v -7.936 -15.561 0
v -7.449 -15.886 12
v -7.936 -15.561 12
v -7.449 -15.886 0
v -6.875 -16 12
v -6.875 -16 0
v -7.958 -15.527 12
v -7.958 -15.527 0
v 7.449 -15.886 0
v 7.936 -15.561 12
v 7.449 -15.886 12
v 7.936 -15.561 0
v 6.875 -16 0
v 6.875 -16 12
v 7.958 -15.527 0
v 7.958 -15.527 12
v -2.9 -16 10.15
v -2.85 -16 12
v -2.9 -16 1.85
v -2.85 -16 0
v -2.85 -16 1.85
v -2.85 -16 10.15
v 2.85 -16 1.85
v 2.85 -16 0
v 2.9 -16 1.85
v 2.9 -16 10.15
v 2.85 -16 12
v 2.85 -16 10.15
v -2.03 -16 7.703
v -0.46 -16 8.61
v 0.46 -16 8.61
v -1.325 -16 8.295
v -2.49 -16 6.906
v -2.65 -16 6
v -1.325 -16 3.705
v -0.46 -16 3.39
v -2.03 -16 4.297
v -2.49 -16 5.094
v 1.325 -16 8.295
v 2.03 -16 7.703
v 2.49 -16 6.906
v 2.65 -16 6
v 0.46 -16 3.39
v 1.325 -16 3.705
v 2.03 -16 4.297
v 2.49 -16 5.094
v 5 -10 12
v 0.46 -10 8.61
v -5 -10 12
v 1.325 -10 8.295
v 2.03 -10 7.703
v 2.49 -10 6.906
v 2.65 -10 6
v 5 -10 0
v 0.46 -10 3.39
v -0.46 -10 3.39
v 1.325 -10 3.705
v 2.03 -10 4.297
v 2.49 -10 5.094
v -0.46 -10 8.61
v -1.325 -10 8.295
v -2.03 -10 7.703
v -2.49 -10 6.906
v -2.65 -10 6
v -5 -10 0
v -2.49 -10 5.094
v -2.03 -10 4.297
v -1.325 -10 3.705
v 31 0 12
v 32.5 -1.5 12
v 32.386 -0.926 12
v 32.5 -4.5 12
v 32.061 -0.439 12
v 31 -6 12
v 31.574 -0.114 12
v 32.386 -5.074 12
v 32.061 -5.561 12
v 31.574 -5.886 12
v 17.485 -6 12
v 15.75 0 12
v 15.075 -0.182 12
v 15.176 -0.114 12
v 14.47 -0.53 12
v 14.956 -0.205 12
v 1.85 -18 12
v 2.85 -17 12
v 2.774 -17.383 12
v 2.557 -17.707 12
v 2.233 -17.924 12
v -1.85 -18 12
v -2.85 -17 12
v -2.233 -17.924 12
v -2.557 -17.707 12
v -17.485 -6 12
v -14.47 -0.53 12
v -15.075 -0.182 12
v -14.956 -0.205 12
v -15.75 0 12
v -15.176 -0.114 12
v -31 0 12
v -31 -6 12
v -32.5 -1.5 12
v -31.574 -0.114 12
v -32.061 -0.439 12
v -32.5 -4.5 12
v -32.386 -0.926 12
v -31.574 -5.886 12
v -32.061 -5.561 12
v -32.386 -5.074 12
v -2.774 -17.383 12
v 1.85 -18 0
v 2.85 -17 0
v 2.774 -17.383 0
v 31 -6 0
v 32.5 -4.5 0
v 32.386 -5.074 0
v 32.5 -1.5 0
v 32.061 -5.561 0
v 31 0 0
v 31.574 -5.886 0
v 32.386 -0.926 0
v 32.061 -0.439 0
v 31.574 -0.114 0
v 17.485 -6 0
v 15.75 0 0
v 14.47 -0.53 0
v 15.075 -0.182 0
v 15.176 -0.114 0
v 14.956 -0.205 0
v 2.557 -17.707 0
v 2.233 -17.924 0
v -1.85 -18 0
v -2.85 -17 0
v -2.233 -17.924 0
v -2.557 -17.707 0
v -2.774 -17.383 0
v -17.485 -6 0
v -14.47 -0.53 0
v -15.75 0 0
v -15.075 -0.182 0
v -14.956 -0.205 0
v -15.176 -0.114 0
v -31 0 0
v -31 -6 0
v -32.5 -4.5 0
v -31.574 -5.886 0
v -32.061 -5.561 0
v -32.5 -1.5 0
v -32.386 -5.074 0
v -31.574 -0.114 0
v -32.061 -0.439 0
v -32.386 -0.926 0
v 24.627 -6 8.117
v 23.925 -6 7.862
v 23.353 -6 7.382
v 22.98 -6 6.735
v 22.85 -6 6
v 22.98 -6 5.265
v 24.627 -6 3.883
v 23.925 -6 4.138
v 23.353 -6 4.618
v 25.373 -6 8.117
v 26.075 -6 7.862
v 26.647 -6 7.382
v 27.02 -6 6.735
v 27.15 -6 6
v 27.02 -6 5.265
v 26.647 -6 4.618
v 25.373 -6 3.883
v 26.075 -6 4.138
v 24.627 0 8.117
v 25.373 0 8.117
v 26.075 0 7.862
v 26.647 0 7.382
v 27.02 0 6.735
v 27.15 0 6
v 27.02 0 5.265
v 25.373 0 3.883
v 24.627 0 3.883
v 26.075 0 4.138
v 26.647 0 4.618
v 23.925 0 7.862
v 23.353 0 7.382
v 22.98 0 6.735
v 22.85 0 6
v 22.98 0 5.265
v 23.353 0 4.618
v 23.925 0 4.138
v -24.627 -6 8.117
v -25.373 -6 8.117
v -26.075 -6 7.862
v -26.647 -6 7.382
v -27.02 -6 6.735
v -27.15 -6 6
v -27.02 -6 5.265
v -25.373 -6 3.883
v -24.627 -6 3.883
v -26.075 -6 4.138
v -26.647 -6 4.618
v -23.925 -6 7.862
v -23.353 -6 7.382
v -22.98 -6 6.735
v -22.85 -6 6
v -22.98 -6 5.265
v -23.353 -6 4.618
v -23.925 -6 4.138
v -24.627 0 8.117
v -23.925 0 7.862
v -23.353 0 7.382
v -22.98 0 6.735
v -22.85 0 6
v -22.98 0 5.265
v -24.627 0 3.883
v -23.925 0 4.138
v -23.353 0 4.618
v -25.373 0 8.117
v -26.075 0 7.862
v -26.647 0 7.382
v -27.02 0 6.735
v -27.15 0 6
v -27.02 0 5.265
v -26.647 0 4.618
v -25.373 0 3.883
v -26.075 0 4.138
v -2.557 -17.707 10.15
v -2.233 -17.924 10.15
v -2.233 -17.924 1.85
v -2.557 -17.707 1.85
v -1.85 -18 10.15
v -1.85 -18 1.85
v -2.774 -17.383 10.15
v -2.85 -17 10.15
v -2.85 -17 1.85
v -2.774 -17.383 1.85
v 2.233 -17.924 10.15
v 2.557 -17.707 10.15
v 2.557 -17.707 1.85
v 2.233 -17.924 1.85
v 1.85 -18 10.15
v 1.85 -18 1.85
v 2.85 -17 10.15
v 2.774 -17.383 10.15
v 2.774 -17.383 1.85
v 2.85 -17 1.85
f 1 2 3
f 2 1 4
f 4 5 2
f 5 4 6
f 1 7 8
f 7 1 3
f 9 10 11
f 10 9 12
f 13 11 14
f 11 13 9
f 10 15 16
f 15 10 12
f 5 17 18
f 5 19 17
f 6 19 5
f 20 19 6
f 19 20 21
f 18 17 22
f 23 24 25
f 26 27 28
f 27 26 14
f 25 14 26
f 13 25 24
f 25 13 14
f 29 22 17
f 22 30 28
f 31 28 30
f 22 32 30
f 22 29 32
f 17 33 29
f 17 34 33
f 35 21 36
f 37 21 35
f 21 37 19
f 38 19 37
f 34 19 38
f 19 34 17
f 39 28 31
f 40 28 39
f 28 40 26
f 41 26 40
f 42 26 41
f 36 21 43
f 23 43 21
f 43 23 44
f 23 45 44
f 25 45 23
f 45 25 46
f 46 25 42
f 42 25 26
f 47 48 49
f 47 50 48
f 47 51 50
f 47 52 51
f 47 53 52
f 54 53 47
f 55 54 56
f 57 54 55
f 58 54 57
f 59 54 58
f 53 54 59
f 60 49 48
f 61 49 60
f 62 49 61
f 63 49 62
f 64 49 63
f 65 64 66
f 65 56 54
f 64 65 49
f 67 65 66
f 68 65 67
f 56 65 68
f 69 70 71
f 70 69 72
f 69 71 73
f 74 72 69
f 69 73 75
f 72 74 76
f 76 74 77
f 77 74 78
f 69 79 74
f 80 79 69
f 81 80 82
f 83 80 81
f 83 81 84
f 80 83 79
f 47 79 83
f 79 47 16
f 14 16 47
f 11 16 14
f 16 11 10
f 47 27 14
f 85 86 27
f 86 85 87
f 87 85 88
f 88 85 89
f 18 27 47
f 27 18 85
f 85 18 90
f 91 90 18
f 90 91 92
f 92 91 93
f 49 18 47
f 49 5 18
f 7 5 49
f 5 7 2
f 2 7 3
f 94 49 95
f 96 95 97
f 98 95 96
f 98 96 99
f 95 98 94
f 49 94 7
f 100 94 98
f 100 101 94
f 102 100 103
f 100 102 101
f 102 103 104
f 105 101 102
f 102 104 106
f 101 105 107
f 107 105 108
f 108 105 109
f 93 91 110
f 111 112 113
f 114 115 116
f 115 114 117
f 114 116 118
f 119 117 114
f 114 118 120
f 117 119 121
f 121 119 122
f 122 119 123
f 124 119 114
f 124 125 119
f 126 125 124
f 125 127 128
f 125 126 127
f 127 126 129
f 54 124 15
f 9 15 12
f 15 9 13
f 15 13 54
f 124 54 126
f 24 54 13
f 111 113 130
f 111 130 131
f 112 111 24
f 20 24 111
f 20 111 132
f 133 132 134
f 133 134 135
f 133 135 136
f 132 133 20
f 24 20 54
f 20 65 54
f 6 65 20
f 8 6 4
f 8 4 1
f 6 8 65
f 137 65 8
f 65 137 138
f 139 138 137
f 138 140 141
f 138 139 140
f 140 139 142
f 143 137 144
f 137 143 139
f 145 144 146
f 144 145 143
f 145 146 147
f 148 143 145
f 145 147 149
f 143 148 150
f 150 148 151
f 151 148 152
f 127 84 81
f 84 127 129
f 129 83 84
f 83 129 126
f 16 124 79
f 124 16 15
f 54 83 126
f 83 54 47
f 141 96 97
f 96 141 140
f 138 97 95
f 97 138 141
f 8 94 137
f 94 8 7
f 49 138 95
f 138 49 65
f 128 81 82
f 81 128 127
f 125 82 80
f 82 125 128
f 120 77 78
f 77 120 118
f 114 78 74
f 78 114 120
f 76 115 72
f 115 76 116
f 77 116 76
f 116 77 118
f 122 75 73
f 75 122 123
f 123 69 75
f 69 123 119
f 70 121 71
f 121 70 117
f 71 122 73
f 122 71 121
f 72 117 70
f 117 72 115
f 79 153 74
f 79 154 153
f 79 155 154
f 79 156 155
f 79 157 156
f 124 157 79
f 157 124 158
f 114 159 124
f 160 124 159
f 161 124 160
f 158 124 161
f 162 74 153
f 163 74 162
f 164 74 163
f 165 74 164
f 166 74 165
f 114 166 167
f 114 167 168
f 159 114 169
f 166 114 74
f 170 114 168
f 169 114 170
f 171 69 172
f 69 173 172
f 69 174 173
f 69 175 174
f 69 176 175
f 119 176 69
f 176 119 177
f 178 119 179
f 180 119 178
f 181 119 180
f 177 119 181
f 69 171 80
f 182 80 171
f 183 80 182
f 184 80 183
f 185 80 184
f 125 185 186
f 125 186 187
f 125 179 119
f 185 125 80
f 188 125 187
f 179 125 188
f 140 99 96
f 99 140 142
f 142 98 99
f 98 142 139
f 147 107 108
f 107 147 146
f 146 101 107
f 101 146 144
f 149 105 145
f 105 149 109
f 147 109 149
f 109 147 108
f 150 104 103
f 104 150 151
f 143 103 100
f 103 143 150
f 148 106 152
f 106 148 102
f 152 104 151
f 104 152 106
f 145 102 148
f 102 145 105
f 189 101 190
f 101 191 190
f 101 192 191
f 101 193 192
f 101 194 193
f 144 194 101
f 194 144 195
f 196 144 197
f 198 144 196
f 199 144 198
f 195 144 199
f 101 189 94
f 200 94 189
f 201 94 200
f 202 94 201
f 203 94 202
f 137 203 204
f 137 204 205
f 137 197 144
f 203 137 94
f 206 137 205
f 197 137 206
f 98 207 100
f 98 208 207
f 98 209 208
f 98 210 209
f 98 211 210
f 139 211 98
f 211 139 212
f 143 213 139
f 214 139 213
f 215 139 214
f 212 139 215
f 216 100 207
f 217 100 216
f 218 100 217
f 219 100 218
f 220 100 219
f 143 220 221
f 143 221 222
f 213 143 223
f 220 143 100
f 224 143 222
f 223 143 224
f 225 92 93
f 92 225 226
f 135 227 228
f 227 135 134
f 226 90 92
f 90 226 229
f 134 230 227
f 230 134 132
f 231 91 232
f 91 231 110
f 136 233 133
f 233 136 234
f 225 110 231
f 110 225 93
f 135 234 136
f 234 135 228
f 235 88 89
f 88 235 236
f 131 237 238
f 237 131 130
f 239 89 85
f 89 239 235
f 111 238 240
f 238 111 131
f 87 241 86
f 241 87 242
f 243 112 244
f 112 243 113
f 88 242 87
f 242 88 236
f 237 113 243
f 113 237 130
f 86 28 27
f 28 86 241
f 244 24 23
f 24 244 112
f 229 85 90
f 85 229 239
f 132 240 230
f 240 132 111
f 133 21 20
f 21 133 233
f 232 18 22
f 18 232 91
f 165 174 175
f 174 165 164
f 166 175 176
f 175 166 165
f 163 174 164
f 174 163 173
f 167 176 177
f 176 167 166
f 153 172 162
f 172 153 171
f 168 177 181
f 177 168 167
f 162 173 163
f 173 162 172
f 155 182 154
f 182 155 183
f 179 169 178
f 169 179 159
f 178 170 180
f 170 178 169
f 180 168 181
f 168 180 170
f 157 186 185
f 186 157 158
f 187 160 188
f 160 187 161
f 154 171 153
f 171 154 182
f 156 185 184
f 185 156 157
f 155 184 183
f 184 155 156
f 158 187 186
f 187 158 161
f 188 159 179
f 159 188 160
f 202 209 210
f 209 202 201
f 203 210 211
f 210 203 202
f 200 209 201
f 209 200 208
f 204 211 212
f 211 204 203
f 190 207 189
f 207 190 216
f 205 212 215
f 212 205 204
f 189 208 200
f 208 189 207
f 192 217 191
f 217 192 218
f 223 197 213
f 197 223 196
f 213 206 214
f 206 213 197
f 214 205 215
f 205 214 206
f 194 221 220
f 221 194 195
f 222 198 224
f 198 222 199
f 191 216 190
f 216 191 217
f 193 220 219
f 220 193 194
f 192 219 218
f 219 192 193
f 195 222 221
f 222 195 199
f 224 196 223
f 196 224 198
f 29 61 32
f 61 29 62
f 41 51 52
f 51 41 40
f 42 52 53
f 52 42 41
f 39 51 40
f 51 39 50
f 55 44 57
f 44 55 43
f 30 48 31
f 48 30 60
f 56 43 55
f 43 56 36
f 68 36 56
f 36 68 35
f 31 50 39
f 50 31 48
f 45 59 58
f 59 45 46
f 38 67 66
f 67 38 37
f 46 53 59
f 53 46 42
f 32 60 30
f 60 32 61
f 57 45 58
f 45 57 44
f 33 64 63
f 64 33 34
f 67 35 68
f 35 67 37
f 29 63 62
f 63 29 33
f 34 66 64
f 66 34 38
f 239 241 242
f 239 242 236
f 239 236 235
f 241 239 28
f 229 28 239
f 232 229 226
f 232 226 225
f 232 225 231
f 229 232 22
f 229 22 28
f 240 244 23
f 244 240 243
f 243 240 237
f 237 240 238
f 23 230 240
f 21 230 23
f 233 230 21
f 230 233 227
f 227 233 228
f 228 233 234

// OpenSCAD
psu_mount_hole_distance = 50; // [0.0:200.0]
psu_mount_hole_d = 4;         // [0.0:10.0]
frame_mount_hole_d = 5;       // [0.0:10.0]
extra_hole_d_tenth = 3;       // [0.0:9.0]
middle_piece_width = 10;      // [0.0:180.0]
middle_piece_height = 10;     // [0.0:30.0]
bracket_width = 12;           // [0.0:30.0]
rill_width = 5;               // [0.0:10.00]
extra_rill_width_tenth = 7;   // [0.0:9.0]

/* [Hidden] */
rill_height = 2;
rill_round_edge = 1;
bracket_round_edge = 1.5;
bracket_height = 6;
bracket_length_beyond_psu_hole = 7.5;

rotate([90,0,0])
difference()
{
  
  extra_rill_width = extra_rill_width_tenth / 10;
  
  union()
  {
    // Middle piece
    translate([-middle_piece_width/2 - bracket_round_edge*2.25, 0, middle_piece_height])
      cube_fillet([middle_piece_width+bracket_round_edge*4.5, bracket_width, bracket_height], vertical=[0,0,0,0], top=[0,bracket_round_edge,0,bracket_round_edge]);

    length = sqrt(2 * pow(middle_piece_height, 2));

    // Angled piece (+x)
    translate([middle_piece_width/2+middle_piece_height,bracket_width,0])
      rotate([0,-45,180])
        translate([-bracket_round_edge/2,0,0])
          cube_fillet([length+4.11, bracket_width, bracket_height], vertical=[0,0,0,0], top=[0,0,0,bracket_round_edge], bottom=[0,bracket_round_edge,0,bracket_round_edge]);

    // Angled piece (-x)
    translate([-middle_piece_width/2-middle_piece_height,0,0])
      rotate([0,-45,0])
        translate([-bracket_round_edge/2,0,0])  
          cube_fillet([length+4.11, bracket_width, bracket_height], vertical=[0,0,0,0], top=[0,0,0,bracket_round_edge], bottom=[0,bracket_round_edge,0,bracket_round_edge]);

    outer_piece_l = (psu_mount_hole_distance-middle_piece_width)/2-middle_piece_height+bracket_length_beyond_psu_hole+bracket_round_edge/2;

    // Outer piece (+x)
    translate([middle_piece_height + middle_piece_width/2 - bracket_round_edge/2,0,0])
      cube_fillet([outer_piece_l, bracket_width, bracket_height], vertical=[0,0,0,0], top=[0,0,0,bracket_round_edge], bottom=[0,bracket_round_edge,0,bracket_round_edge]);

    // Outer piece (-x)
    rotate([0,0,180])
      translate([middle_piece_height + middle_piece_width/2 - bracket_round_edge/2,-bracket_width,0])
        cube_fillet([outer_piece_l, bracket_width, bracket_height], vertical=[0,0,0,0], top=[0,0,0,bracket_round_edge], bottom=[0,bracket_round_edge,0,bracket_round_edge]);

    // Rill
    translate([-(rill_width+extra_rill_width)/2,0,bracket_height + middle_piece_height])
      cube_fillet([rill_width+extra_rill_width, bracket_width, rill_height], vertical=[0,0,0,0], top=[0,rill_round_edge,0,rill_round_edge]);
  }

  extra_hole_d = extra_hole_d_tenth / 10;

  // PSU Mounting holes
  translate([psu_mount_hole_distance/2, bracket_width/2, -0.05])
    cylinder(d=psu_mount_hole_d+extra_hole_d, h = bracket_height + 0.1, $fn=18);

  translate([-psu_mount_hole_distance/2,bracket_width/2,-0.05])
    cylinder(d=psu_mount_hole_d+extra_hole_d, h = bracket_height + 0.1, $fn=18);

  // Frame mounting hole
  translate([0, bracket_width/2, middle_piece_height-0.05])
    cylinder(d=frame_mount_hole_d+extra_hole_d, h = bracket_height + rill_height + 0.1, $fn=18);
  
  // Hole in the rill
  rill_hole_width = frame_mount_hole_d + extra_hole_d + 3;
    translate([-(rill_width+extra_rill_width)/2 - 0.05, bracket_width / 2 - rill_hole_width / 2,bracket_height + middle_piece_height])
      cube([rill_width+extra_rill_width + 0.1, rill_hole_width, rill_height+ 0.05]);
}


// http://axuv.blogspot.nl/2012/05/openscad-helper-funcions-for-better.html
module fillet(radius, height=100, $fn=16) {
    //this creates negative of fillet,
    //i.e. thing to be substracted from object
    translate([-radius, -radius, -height/2-0.01])
        difference() {
            cube([radius*2, radius*2, height+0.02]);
            cylinder(r=radius, h=height+0.02, $fn=16);
        }
}

module cube_negative_fillet(
        size,
        radius=-1,
        vertical=[3,3,3,3], 
        top=[0,0,0,0],
        bottom=[0,0,0,0],
        $fn=0
    ){

    j=[1,0,1,0];

    for (i=[0:3]) {
        if (radius > -1) {
            rotate([0, 0, 90*i])
                translate([size[1-j[i]]/2, size[j[i]]/2, 0])
                    fillet(radius, size[2], $fn=$fn);
        } else {
            rotate([0, 0, 90*i])
                translate([size[1-j[i]]/2, size[j[i]]/2, 0])
                    fillet(vertical[i], size[2], $fn=$fn);
        }
        rotate([90*i, -90, 0])
            translate([size[2]/2, size[j[i]]/2, 0 ])
                fillet(top[i], size[1-j[i]], $fn=$fn);
        rotate([90*(4-i), 90, 0])
            translate([size[2]/2, size[j[i]]/2, 0])
                fillet(bottom[i], size[1-j[i]], $fn=$fn);
    }
}

module cube_fillet_inside(
         size,
        radius=-1,
        vertical=[3,3,3,3],
        top=[0,0,0,0],
        bottom=[0,0,0,0],
        $fn=0
    ){
    if (radius == 0) {
        cube(size, center=true);
    } else {
        difference() {
            cube(size, center=true);
            cube_negative_fillet(size, radius, vertical, top, bottom, $fn);
        }
    }
}

module cube_fillet(
        size,
        radius=-1,
        vertical=[3,3,3,3],
        top=[0,0,0,0],
        bottom=[0,0,0,0],
        center=false,
        $fn=0 
    ){
    if (center) {
        cube_fillet_inside(size, radius, vertical, top, bottom, $fn);
    } else {
        translate([size[0]/2, size[1]/2, size[2]/2])
            cube_fillet_inside(size, radius, vertical, top, bottom, $fn);
    }
}
